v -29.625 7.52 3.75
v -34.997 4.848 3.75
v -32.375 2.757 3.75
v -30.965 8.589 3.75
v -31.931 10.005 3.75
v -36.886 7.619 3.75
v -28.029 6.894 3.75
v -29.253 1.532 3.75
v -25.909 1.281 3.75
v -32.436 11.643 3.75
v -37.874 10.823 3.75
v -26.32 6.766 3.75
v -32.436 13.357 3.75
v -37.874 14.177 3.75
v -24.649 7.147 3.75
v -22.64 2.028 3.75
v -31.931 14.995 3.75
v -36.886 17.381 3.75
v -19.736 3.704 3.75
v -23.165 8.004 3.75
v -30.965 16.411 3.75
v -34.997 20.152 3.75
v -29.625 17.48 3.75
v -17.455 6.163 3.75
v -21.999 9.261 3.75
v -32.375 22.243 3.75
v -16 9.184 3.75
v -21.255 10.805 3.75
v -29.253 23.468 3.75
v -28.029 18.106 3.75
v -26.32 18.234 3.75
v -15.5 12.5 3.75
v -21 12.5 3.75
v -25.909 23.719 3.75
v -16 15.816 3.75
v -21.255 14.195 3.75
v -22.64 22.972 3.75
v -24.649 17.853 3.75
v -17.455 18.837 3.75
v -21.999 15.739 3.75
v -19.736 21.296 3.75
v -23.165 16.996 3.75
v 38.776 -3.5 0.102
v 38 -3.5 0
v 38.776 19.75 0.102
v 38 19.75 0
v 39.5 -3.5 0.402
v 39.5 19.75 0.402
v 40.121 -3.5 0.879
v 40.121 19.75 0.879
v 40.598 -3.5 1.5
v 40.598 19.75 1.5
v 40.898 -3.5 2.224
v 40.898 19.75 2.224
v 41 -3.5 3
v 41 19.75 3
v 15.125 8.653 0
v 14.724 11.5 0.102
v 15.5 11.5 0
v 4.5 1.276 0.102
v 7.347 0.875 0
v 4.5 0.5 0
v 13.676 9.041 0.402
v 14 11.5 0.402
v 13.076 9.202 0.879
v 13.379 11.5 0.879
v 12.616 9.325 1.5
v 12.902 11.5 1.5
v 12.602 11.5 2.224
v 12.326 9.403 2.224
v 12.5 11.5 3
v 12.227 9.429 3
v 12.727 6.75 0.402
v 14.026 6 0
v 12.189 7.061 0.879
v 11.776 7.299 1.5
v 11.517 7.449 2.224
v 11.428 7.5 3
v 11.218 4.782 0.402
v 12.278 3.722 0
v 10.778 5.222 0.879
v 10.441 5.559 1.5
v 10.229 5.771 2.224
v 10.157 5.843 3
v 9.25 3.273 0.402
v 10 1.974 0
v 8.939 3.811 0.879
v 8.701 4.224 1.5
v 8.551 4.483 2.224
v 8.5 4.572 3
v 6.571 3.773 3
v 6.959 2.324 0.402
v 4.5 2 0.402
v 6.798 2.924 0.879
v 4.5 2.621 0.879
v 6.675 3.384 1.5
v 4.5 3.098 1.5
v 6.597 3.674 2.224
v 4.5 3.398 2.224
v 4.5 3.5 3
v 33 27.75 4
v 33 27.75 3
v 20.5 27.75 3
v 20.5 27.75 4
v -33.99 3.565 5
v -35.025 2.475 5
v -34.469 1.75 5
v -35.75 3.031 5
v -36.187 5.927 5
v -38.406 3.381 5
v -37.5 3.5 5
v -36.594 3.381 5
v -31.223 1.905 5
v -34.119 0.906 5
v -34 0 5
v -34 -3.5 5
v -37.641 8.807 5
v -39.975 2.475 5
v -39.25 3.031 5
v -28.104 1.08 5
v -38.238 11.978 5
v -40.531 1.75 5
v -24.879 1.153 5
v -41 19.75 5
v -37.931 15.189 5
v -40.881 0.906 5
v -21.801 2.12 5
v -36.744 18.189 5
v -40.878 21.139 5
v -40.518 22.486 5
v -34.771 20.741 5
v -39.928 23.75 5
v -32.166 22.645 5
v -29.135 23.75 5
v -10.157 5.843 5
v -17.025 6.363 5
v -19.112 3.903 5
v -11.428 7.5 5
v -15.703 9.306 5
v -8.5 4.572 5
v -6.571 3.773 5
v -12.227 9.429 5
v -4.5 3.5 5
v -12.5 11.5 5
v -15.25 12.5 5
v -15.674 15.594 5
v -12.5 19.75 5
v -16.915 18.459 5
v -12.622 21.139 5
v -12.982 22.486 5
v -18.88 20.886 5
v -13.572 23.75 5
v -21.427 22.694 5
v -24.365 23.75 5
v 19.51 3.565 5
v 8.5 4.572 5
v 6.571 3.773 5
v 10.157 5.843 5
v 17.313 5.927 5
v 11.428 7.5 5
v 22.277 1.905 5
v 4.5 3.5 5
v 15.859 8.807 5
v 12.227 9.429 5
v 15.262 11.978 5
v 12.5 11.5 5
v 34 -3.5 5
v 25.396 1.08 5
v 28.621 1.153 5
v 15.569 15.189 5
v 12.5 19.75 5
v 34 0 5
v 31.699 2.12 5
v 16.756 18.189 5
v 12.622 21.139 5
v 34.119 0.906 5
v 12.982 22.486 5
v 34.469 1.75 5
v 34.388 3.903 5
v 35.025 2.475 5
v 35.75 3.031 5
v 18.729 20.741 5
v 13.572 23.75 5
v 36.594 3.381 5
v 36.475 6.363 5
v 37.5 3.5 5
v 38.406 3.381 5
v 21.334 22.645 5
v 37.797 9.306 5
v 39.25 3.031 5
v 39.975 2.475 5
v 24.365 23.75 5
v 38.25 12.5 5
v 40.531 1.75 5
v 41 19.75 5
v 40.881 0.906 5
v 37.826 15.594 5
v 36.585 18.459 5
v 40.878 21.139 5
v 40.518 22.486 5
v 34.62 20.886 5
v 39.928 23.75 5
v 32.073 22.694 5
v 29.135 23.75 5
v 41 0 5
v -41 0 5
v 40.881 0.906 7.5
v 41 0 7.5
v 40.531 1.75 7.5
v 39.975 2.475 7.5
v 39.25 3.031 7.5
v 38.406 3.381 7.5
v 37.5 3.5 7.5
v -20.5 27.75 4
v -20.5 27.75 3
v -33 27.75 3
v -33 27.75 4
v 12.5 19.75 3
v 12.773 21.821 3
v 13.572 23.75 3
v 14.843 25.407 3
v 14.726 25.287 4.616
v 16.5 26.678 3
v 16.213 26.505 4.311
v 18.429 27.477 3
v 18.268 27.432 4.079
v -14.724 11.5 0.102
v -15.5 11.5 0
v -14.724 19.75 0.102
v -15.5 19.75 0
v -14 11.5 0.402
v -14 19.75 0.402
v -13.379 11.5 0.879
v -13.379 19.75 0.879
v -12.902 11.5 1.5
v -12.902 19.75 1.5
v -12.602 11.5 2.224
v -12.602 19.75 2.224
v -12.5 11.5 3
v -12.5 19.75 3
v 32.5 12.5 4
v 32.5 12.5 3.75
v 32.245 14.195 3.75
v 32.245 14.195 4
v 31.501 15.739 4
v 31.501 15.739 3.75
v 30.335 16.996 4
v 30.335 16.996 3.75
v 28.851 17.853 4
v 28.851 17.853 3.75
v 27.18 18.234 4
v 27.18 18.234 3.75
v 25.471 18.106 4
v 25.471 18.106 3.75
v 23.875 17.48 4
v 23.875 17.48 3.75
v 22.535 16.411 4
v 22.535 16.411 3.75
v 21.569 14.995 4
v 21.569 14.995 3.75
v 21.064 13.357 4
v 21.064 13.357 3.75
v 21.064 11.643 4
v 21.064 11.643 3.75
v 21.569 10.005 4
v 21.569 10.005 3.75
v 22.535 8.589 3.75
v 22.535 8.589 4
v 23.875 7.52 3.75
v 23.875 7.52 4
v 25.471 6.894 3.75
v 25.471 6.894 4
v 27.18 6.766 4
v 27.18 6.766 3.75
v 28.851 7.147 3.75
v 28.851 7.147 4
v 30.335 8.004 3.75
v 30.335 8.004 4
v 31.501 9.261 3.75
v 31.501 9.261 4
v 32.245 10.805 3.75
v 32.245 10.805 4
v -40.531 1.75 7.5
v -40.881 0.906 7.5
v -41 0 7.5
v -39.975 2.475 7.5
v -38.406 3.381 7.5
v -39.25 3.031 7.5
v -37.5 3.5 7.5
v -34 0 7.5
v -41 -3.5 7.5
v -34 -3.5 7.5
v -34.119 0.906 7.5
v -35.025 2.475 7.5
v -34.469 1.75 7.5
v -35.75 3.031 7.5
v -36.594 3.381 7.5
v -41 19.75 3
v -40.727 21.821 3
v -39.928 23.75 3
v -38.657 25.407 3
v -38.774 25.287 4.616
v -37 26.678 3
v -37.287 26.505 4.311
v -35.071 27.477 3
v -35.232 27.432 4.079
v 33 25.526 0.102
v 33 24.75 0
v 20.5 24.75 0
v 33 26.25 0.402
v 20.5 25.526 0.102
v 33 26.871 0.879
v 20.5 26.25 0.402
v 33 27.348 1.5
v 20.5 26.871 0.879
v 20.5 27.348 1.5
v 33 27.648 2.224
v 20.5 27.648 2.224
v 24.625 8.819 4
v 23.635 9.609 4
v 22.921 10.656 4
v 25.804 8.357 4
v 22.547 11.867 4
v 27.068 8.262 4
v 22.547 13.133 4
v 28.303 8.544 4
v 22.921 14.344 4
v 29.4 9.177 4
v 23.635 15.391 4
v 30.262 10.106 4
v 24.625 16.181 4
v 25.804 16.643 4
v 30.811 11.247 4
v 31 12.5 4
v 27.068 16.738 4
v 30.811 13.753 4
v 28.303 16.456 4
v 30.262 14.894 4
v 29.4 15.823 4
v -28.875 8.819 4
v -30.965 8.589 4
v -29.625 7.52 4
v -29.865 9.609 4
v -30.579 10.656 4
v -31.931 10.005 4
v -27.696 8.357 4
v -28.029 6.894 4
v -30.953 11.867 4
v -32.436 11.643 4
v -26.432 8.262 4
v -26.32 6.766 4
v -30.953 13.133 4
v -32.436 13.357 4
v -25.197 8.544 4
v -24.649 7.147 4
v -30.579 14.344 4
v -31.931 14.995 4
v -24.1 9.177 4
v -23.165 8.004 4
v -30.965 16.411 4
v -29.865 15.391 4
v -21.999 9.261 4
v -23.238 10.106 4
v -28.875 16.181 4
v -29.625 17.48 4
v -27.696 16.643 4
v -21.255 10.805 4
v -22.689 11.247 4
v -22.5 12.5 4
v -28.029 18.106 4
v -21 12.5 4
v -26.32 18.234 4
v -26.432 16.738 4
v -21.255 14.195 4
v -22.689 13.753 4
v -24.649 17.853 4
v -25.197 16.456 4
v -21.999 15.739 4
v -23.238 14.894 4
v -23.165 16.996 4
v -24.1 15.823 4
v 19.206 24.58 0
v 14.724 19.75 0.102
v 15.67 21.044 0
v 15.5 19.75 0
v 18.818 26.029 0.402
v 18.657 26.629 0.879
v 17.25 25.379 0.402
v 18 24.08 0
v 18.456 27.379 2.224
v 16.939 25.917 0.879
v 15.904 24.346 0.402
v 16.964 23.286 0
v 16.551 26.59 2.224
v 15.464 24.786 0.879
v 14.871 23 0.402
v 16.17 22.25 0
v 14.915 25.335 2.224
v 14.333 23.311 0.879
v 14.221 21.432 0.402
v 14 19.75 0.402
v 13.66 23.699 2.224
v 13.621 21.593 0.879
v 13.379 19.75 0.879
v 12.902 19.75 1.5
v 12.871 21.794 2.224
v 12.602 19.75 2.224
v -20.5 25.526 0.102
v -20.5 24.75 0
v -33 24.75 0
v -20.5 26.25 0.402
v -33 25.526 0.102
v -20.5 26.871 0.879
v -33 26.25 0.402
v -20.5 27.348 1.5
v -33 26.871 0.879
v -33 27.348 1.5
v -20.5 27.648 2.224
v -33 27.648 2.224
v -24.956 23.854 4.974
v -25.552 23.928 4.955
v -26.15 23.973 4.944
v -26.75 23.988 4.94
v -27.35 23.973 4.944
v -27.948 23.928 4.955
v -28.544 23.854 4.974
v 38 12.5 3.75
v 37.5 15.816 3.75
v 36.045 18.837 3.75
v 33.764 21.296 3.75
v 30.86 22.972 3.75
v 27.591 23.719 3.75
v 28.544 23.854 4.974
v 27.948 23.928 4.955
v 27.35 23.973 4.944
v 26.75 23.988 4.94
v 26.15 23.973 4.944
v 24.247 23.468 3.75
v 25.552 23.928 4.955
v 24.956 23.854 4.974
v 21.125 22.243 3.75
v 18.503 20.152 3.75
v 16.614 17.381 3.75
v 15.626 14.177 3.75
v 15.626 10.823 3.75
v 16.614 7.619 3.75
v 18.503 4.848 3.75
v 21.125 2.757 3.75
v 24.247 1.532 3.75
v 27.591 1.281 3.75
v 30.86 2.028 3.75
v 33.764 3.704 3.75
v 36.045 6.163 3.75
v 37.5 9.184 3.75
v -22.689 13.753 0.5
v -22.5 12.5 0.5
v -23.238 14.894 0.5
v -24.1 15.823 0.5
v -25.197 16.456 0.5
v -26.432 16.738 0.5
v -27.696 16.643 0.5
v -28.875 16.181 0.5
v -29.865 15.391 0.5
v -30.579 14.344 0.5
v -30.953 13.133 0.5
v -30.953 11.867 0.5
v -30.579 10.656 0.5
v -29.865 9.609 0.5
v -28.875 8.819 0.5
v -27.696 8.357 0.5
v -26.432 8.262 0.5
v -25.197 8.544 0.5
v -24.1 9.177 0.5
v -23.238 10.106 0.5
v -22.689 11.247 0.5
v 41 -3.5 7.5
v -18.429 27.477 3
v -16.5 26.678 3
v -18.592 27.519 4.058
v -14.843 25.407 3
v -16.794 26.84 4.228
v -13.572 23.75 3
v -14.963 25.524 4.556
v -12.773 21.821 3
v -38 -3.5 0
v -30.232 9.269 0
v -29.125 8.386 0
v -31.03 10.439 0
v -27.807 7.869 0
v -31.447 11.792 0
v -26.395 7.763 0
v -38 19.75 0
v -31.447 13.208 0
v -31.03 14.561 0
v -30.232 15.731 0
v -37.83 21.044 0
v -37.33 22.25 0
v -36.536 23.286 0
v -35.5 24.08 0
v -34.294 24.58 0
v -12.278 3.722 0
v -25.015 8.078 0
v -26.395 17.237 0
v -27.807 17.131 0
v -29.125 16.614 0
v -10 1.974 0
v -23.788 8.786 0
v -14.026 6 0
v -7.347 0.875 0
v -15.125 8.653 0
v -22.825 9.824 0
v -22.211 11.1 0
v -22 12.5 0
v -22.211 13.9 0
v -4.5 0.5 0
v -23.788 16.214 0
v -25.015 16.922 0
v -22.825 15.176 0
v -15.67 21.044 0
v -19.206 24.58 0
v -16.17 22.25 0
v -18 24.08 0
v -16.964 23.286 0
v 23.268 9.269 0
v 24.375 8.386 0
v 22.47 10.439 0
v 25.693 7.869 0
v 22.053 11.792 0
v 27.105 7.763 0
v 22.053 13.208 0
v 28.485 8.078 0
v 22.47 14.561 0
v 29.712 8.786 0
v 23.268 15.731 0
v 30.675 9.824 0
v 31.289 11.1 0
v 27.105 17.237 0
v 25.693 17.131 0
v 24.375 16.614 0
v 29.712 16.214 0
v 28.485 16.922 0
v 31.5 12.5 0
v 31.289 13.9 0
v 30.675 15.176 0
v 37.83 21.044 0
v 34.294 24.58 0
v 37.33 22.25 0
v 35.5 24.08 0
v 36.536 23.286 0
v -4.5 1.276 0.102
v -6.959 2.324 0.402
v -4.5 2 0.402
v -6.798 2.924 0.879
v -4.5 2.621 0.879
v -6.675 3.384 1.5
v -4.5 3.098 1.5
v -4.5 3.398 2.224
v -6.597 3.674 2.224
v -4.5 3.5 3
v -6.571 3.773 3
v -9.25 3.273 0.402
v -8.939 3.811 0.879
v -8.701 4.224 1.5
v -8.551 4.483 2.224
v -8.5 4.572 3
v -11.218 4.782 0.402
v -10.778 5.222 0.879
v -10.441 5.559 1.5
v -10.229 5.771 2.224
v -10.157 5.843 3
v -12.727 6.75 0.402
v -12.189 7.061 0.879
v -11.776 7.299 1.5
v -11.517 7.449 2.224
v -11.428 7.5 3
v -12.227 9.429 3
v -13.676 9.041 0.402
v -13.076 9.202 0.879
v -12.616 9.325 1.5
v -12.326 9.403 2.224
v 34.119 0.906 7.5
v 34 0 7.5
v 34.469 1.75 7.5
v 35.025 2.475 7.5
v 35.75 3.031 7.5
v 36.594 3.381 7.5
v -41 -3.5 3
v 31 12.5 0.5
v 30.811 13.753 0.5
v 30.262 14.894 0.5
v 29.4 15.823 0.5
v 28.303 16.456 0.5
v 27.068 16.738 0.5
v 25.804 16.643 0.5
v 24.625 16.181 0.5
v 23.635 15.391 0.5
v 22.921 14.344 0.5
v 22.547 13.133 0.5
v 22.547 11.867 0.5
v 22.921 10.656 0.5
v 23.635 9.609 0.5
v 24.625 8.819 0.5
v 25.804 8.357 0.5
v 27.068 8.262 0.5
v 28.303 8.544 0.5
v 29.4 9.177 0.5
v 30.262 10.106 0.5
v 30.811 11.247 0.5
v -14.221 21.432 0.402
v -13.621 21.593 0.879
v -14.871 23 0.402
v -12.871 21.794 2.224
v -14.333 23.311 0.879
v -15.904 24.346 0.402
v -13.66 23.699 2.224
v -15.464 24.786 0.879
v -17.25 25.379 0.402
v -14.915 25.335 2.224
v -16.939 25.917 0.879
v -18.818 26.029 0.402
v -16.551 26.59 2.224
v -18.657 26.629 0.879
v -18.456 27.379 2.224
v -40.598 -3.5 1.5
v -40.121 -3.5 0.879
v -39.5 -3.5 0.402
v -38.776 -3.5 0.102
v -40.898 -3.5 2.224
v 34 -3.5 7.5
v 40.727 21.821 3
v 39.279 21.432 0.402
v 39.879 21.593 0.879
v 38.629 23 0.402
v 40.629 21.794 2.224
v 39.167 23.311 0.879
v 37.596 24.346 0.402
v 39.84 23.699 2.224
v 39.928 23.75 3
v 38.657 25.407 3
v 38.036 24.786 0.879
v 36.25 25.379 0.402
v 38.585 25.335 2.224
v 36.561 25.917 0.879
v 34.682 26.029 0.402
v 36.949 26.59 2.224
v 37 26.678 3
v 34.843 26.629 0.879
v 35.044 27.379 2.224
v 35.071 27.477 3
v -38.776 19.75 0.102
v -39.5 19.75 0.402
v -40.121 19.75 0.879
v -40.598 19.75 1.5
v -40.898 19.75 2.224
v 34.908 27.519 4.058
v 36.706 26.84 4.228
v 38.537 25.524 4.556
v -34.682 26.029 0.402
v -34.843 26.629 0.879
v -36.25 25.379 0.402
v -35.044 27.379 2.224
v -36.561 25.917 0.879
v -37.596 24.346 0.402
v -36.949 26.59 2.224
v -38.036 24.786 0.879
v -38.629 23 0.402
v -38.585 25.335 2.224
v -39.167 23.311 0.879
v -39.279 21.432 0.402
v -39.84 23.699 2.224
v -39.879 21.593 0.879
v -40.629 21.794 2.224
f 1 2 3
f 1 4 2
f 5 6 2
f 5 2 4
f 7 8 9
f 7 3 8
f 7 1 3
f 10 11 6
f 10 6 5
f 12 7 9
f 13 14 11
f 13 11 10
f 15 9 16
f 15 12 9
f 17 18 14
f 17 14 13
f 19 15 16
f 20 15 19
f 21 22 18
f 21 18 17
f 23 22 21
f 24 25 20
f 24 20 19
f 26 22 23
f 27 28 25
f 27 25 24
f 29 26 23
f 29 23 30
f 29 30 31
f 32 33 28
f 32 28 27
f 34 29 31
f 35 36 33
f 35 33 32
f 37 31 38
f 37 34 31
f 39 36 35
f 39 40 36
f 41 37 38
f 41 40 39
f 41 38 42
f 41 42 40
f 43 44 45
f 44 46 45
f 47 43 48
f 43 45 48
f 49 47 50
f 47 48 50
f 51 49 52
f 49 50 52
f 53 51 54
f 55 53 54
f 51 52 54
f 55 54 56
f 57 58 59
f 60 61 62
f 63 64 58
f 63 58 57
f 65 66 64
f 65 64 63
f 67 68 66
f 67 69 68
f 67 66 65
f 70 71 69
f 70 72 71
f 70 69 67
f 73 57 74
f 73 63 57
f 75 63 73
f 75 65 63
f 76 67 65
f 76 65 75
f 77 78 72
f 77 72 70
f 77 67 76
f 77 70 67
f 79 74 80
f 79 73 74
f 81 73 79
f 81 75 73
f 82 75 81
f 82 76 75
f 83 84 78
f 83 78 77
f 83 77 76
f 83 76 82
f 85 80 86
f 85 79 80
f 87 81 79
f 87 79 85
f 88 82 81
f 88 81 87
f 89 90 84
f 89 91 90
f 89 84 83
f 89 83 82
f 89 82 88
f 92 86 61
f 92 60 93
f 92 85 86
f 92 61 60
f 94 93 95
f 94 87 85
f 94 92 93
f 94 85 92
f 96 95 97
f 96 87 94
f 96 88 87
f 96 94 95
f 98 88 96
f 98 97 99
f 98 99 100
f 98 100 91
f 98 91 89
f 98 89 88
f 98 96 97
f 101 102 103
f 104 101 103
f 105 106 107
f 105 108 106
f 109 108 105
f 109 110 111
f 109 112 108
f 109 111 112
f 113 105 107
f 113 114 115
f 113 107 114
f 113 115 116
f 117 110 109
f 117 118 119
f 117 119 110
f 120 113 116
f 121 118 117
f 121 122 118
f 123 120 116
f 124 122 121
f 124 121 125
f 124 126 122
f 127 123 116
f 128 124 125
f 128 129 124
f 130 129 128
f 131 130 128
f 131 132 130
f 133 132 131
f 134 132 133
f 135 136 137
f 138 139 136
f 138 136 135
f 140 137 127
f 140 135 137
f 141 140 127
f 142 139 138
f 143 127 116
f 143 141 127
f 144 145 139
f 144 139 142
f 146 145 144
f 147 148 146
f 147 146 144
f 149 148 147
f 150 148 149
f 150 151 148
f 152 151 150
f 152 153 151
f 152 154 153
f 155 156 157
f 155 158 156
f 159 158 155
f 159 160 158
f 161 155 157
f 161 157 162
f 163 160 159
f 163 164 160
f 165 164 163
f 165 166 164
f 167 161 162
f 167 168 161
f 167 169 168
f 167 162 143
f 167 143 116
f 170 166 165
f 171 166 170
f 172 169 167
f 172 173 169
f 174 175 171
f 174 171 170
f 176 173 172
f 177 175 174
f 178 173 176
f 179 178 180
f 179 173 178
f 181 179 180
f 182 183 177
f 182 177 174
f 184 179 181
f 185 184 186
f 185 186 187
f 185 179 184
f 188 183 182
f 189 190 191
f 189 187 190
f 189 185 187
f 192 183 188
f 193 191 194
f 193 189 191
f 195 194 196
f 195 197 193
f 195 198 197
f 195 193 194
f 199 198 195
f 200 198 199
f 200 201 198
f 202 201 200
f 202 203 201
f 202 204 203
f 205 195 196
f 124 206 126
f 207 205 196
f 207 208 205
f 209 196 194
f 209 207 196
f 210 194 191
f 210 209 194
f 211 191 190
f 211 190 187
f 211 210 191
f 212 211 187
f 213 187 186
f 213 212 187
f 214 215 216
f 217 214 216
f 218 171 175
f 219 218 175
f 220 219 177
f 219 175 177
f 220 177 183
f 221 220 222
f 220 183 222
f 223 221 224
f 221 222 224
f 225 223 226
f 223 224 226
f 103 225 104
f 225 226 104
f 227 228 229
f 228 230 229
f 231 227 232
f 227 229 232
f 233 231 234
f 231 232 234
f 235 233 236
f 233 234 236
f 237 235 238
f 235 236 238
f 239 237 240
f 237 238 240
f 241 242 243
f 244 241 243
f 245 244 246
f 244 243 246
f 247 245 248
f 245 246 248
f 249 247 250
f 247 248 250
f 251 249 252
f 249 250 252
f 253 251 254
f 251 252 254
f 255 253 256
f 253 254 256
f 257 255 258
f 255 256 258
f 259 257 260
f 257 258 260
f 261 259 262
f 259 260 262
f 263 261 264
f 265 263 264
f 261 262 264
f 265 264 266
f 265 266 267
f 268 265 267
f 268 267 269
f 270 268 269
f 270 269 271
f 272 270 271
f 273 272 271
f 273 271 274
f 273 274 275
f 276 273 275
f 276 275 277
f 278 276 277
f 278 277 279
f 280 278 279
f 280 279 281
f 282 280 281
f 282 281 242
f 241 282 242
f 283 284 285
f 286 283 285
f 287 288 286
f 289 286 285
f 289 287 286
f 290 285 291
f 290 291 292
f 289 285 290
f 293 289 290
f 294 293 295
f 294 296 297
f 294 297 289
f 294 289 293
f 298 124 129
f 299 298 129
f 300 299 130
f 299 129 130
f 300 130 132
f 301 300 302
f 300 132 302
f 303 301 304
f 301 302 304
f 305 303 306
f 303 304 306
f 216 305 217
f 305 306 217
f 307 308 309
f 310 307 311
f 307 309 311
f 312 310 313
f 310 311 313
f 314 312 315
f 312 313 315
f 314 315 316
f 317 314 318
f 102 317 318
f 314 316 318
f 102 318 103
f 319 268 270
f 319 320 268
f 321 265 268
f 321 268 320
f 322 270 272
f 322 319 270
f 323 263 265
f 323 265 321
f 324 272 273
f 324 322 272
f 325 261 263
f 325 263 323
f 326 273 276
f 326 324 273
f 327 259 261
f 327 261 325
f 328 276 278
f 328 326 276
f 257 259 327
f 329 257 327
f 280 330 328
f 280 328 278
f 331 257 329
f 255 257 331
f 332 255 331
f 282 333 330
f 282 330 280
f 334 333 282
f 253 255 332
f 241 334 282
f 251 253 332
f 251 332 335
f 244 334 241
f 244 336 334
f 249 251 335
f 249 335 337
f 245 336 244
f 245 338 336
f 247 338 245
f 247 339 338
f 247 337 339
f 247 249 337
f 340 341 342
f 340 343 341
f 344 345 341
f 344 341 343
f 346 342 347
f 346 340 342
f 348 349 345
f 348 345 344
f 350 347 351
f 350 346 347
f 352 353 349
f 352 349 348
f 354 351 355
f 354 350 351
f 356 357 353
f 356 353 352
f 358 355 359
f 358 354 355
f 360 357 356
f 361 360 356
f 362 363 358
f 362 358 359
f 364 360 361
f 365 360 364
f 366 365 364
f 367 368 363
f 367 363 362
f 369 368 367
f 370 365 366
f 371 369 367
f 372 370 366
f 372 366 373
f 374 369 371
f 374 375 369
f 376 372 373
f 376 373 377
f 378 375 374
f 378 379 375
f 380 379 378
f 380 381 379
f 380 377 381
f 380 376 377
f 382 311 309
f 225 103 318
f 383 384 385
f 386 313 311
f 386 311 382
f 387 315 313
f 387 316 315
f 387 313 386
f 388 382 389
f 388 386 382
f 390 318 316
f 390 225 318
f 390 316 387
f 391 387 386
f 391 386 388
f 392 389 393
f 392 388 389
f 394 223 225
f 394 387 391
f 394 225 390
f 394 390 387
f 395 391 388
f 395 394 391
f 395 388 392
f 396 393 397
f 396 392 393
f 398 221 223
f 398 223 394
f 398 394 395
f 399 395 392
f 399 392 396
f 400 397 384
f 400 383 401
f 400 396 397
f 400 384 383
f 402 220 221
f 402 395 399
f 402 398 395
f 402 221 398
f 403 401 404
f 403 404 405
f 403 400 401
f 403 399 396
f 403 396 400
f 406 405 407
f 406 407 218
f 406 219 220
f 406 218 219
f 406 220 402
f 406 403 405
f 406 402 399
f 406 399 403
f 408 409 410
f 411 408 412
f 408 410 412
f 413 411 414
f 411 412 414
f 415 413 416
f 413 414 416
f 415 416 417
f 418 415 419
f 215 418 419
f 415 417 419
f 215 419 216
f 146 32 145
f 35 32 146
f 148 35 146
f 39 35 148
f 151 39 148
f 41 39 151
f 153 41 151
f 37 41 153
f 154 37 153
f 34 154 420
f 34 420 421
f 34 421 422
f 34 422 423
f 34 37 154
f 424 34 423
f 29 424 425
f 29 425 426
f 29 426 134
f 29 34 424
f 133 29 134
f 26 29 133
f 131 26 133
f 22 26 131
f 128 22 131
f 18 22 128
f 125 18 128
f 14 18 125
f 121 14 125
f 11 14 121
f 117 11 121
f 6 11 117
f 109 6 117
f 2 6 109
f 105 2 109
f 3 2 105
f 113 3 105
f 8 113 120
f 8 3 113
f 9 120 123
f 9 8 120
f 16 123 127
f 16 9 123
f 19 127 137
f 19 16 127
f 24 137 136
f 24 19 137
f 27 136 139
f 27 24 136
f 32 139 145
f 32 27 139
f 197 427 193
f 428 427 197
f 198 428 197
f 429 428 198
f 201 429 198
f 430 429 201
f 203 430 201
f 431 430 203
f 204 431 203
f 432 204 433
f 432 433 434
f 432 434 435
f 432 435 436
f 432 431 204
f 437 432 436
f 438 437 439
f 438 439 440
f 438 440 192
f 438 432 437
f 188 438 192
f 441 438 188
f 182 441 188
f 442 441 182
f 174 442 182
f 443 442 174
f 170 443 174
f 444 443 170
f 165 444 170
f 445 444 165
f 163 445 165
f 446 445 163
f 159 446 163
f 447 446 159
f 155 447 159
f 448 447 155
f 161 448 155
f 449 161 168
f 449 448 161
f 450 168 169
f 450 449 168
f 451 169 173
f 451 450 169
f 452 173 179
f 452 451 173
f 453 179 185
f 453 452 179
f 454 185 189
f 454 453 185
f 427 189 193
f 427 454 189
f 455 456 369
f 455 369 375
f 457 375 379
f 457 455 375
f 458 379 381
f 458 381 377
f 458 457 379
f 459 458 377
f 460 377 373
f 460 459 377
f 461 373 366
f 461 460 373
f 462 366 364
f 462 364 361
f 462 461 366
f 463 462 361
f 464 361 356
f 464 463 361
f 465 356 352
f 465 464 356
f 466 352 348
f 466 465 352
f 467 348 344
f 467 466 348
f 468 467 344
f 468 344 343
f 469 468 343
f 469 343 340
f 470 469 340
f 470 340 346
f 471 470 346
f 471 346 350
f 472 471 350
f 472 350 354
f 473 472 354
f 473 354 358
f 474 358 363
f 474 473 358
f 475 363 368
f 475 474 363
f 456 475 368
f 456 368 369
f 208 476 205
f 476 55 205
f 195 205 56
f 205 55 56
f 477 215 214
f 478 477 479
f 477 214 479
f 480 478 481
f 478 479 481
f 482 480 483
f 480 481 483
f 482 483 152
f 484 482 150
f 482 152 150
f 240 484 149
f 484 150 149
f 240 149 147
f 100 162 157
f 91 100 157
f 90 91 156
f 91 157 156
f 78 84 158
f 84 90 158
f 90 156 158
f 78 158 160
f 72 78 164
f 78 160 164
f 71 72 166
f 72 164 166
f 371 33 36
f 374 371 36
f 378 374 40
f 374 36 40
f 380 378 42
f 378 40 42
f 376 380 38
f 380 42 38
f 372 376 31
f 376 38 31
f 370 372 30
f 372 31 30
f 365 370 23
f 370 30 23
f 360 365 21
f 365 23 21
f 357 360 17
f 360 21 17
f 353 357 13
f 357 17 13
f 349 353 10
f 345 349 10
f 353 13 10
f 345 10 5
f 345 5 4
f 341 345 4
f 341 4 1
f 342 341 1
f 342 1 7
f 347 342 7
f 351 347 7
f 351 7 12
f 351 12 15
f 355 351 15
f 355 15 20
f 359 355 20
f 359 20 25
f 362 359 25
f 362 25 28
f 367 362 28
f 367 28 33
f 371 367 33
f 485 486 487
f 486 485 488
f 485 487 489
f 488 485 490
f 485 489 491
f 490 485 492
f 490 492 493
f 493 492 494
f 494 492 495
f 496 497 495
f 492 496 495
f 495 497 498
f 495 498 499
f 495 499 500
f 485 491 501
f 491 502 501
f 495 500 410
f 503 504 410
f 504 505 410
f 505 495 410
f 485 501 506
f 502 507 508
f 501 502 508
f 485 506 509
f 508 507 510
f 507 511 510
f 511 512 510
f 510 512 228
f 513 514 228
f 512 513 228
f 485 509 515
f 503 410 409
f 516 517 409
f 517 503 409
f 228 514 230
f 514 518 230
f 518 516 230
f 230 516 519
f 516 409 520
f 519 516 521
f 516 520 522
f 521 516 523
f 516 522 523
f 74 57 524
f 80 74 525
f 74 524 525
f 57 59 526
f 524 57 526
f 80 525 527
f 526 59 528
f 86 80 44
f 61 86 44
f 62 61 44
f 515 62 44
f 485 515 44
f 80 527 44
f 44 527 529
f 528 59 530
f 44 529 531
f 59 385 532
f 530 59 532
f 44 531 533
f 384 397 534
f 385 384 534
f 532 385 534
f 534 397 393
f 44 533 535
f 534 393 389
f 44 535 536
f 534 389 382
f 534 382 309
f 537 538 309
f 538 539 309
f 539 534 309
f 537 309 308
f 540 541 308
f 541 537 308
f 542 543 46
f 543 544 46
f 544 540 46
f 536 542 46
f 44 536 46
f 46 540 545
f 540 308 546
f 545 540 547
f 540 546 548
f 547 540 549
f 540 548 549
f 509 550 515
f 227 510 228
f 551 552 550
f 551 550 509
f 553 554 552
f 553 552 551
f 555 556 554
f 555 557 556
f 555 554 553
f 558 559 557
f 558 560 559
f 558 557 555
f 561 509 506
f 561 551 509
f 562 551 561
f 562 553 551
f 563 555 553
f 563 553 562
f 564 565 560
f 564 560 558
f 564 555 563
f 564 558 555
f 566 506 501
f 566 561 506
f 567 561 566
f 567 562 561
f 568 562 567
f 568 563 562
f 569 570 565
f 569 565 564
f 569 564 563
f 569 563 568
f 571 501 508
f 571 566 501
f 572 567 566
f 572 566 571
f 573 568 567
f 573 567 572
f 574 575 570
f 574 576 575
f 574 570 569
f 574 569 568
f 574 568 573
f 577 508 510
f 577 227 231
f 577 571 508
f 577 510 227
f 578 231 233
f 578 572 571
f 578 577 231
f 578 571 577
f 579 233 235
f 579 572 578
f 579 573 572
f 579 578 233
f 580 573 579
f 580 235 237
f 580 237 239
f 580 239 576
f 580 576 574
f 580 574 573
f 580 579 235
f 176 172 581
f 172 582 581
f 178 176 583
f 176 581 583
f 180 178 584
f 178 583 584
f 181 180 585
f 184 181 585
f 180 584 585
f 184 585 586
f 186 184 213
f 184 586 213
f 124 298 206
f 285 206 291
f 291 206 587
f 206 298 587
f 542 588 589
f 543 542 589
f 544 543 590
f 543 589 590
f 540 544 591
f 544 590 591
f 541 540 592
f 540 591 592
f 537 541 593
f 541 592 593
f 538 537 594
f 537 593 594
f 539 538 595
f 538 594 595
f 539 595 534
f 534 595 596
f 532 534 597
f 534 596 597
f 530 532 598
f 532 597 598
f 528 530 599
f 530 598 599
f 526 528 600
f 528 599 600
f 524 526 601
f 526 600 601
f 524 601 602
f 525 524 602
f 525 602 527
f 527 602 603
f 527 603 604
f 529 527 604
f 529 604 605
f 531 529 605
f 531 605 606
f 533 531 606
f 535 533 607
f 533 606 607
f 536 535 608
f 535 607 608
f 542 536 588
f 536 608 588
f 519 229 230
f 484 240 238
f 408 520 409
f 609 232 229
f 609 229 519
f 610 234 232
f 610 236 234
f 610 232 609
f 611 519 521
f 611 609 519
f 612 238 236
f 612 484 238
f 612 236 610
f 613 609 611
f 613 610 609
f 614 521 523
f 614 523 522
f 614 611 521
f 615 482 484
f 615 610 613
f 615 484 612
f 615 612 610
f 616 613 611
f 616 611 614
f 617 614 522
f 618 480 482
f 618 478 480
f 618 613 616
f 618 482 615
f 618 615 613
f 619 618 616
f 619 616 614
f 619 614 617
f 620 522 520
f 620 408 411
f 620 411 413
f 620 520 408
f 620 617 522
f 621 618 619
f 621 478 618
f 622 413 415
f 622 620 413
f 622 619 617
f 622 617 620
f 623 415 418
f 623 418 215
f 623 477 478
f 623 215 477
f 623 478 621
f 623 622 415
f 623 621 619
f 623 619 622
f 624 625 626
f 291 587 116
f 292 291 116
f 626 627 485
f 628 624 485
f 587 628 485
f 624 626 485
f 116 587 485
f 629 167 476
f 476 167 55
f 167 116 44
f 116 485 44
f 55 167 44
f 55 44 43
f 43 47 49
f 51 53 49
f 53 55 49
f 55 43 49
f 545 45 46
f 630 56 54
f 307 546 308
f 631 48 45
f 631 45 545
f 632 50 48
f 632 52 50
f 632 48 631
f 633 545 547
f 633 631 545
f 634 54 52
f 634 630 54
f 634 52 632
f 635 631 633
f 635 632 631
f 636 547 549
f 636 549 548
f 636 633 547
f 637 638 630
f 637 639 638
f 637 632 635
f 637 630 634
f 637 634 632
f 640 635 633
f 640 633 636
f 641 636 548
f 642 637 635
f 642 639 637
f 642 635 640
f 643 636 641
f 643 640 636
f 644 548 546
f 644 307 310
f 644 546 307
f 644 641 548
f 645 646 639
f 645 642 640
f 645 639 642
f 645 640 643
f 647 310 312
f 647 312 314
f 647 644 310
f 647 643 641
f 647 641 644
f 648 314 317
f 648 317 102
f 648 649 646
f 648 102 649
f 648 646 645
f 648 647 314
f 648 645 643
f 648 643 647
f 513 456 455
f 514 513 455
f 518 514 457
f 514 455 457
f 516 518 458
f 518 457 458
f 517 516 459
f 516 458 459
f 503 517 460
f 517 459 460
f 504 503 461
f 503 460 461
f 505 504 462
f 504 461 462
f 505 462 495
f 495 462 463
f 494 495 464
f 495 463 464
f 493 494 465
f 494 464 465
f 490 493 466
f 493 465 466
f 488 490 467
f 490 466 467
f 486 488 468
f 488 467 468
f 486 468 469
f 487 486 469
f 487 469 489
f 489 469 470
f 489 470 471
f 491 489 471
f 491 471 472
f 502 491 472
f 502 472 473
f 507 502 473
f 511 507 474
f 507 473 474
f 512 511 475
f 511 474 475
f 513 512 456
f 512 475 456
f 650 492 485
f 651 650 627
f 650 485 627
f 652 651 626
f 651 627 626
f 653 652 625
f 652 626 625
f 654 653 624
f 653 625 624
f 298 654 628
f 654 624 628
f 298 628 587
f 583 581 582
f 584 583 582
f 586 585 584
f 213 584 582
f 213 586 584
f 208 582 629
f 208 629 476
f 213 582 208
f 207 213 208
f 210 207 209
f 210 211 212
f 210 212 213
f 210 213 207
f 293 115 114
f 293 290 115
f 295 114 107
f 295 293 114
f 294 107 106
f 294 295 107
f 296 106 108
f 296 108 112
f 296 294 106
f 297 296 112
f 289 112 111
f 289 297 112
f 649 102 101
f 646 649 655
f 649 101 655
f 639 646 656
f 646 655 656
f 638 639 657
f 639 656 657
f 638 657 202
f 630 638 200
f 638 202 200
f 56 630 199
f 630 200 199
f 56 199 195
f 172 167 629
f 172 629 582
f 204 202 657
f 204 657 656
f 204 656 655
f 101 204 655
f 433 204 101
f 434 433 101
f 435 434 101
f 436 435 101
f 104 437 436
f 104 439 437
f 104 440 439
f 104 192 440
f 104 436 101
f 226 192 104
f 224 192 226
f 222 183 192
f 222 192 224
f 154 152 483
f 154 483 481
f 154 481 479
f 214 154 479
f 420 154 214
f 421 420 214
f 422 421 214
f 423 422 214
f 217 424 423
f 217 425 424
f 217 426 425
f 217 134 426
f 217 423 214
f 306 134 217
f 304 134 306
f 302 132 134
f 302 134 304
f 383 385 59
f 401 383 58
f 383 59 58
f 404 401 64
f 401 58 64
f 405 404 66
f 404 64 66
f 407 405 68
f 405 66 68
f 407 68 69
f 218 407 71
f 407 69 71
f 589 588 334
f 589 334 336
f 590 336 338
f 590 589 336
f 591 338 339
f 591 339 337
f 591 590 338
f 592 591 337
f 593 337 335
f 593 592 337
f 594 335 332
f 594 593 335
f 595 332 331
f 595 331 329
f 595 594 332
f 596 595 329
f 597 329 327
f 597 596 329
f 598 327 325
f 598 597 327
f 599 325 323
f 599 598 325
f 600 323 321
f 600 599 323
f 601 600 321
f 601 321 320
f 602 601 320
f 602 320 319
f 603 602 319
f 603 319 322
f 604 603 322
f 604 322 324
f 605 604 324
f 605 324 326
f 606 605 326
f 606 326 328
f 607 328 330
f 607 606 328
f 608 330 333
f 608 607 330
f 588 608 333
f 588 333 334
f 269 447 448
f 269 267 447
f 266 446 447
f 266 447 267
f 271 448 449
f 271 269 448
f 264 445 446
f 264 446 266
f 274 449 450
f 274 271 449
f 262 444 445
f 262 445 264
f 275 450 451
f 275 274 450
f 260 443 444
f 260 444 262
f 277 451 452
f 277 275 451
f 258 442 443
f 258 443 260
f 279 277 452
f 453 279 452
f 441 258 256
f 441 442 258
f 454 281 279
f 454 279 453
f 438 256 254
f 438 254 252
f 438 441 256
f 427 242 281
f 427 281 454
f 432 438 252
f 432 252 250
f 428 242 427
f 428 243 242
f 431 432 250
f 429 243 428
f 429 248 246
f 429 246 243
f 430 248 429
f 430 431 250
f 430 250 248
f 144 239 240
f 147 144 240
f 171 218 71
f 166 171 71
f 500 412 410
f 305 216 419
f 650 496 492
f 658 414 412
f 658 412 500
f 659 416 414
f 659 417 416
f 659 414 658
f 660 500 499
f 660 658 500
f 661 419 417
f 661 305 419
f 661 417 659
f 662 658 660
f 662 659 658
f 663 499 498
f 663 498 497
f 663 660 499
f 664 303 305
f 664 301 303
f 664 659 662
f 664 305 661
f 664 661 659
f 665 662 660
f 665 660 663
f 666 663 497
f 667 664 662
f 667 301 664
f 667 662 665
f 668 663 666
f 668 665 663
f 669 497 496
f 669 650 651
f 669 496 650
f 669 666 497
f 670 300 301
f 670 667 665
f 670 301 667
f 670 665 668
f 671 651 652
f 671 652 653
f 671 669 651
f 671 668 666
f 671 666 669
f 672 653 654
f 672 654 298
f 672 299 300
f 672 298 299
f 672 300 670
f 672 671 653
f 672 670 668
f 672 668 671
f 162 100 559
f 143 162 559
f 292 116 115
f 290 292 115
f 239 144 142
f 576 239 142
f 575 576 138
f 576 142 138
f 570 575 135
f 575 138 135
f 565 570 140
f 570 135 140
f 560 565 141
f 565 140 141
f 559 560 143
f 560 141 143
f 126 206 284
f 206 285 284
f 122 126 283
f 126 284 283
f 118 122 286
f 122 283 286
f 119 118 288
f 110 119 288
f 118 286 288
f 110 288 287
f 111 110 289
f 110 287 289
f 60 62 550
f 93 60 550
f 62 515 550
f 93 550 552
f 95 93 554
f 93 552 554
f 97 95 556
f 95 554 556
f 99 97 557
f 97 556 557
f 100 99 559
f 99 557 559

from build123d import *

# Parameters (mm, degrees)
F0_W        = 7
F0_H        = 7
F0_R        = 11.25
F1_DEPTH    = 5
F0_R_2      = 5.75
F0_R_3      = 4.25
F2_DEPTH    = 3.75
F3_DEPTH    = 4
F4_DEPTH    = 7.5
F5_R        = 8
F6_T1_DEPTH = 33.2770199982
F6_T3_DEPTH = 33.2770199982
F7_R        = 3
F8_R        = 3.49999
F9_T2_ANGLE = 270
F9_T4_ANGLE = 270
F9_T6_ANGLE = 90
F9_T8_ANGLE = 90
F10_SIZE    = 0.5


# Not quite as in the source:
# - a fillet or chamfer that OpenCascade refuses, or shapes differently, is made with other operations: its cross-section is extruded or revolved along the edge and cut away or added
# - a fillet or chamfer is up to 0.001 mm smaller than in the source, because OpenCascade refuses the exact size


with BuildPart() as f1:
    # F0 (on Top) → F1 (new body)
    with BuildSketch(Plane.XY):
        with Locations((37.5, 0)):
            Rectangle(F0_W, F0_H)
        Polygon((-34, -3.5), (34, -3.5), (34, 3.5), (41, 3.5), (41, 27.75), (12.5, 27.75), (12.5, 3.5), (-12.5, 3.5), (-12.5, 27.75), (-41, 27.75), (-41, 3.5), (-34, 3.5), align=None)
        with Locations((-26.75, 12.5)):
            Circle(F0_R, mode=Mode.SUBTRACT)
        with Locations((26.75, 12.5)):
            Circle(F0_R, mode=Mode.SUBTRACT)
        with Locations((-37.5, 0)):
            Rectangle(F0_W, F0_H)
    extrude(amount=F1_DEPTH)

    # F0 (on Top) → F2 (join)
    with BuildSketch(Plane.XY):
        with Locations((-26.75, 12.5)):
            Circle(F0_R)
        with Locations((-26.75, 12.5)):
            Circle(F0_R_2, mode=Mode.SUBTRACT)
        with Locations((-26.75, 12.5)):
            Circle(F0_R_2)
        with Locations((-26.75, 12.5)):
            Circle(F0_R_3, mode=Mode.SUBTRACT)
        with Locations((26.75, 12.5)):
            Circle(F0_R)
        with Locations((26.75, 12.5)):
            Circle(F0_R_2, mode=Mode.SUBTRACT)
        with Locations((26.75, 12.5)):
            Circle(F0_R_2)
        with Locations((26.75, 12.5)):
            Circle(F0_R_3, mode=Mode.SUBTRACT)
    extrude(amount=F2_DEPTH)

    # F0 (on Top) → F3 (join)
    with BuildSketch(Plane.XY):
        with Locations((-26.75, 12.5)):
            Circle(F0_R_2)
        with Locations((-26.75, 12.5)):
            Circle(F0_R_3, mode=Mode.SUBTRACT)
        with Locations((26.75, 12.5)):
            Circle(F0_R_2)
        with Locations((26.75, 12.5)):
            Circle(F0_R_3, mode=Mode.SUBTRACT)
    extrude(amount=F3_DEPTH)

    # F0 (on Top) → F4 (join)
    with BuildSketch(Plane.XY):
        with Locations((-37.5, 0)):
            Rectangle(F0_W, F0_H)
        with Locations((37.5, 0)):
            Rectangle(F0_W, F0_H)
    extrude(amount=F4_DEPTH)

    # F5
    f5_edges = [f1.edges().sort_by_distance(p)[0] for p in [
        (-12.5, 3.5, 2.5),
        (12.5, 3.5, 2.5),
        (12.5, 27.75, 2.5),
        (41, 27.75, 2.5),
        (-41, 27.75, 2.5),
        (-12.5, 27.75, 2.5),
    ]]
    fillet(f5_edges, radius=F5_R)

    # F6: chamfer of 1 x 4 on 2 edges, made by hand

    # F6_s2 → F6_t1 (cut)
    with BuildSketch(Plane.YZ.offset(-43.3885099991)):
        Polygon((23.75, 5), (27.75, 4), (27.75, 5), align=None)
    extrude(amount=F6_T1_DEPTH, mode=Mode.SUBTRACT)

    # F6_s4 → F6_t3 (cut)
    with BuildSketch(Plane.YZ.offset(10.1114900009)):
        Polygon((23.75, 5), (27.75, 4), (27.75, 5), align=None)
    extrude(amount=F6_T3_DEPTH, mode=Mode.SUBTRACT)

    # F7
    f7_edges = [f1.edges().sort_by_distance(p)[0] for p in [
        (-26.75, 27.75, 0),
        (41, 8.125, 0),
        (38.656854, 25.406854, 0),
        (26.75, 27.75, 0),
        (-41, 8.125, 0),
        (14.843146, 25.406854, 0),
        (-38.656854, 25.406854, 0),
        (12.5, 15.625, 0),
        (10.156854, 5.843146, 0),
        (-14.843146, 25.406854, 0),
        (0, 3.5, 0),
        (-12.5, 15.625, 0),
        (-10.156854, 5.843146, 0),
    ]]
    fillet(f7_edges, radius=F7_R)

    # F8 (radius 3.5 in the source; OpenCascade refuses exactly that, so slightly less here)
    f8_edges = [f1.edges().sort_by_distance(p)[0] for p in [
        (-34, 3.5, 6.25),
        (-41, 3.5, 6.25),
        (34, 3.5, 6.25),
        (41, 3.5, 6.25),
    ]]
    fillet(f8_edges, radius=F8_R)

    # F9: chamfer of 1.25 x 0.25 on 4 edges, made by hand

    # F9_s1 → F9_t2 (revolve, cut)
    with BuildSketch(Plane.YZ.offset(-26.75)):
        Polygon((24, 5), (23.75, 3.75), (23.75, 5), align=None)
    revolve(axis=Axis((-26.75, 12.5, 5), (0, 0, 1)), revolution_arc=F9_T2_ANGLE, mode=Mode.SUBTRACT)

    # F9_s3 → F9_t4 (revolve, cut)
    with BuildSketch(Plane.YZ.offset(26.75)):
        Polygon((24, 5), (23.75, 3.75), (23.75, 5), align=None)
    revolve(axis=Axis((26.75, 12.5, 5), (0, 0, 1)), revolution_arc=F9_T4_ANGLE, mode=Mode.SUBTRACT)

    # F9_s5 → F9_t6 (revolve, cut)
    with BuildSketch(Plane.XZ.offset(-12.5)):
        Polygon((-15.25, 5), (-15.5, 3.75), (-15.5, 5), align=None)
    revolve(axis=Axis((-26.75, 12.5, 5), (0, 0, 1)), revolution_arc=F9_T6_ANGLE, mode=Mode.SUBTRACT)

    # F9_s7 → F9_t8 (revolve, cut)
    with BuildSketch(Plane.XZ.offset(-12.5)):
        Polygon((38.25, 5), (38, 3.75), (38, 5), align=None)
    revolve(axis=Axis((26.75, 12.5, 5), (0, 0, 1)), revolution_arc=F9_T8_ANGLE, mode=Mode.SUBTRACT)

    # F10
    f10_edges = [f1.edges().sort_by_distance(p)[0] for p in [
        (22.5, 12.5, 0),
        (-31, 12.5, 0),
    ]]
    chamfer(f10_edges, length=F10_SIZE)


solid = f1.part
